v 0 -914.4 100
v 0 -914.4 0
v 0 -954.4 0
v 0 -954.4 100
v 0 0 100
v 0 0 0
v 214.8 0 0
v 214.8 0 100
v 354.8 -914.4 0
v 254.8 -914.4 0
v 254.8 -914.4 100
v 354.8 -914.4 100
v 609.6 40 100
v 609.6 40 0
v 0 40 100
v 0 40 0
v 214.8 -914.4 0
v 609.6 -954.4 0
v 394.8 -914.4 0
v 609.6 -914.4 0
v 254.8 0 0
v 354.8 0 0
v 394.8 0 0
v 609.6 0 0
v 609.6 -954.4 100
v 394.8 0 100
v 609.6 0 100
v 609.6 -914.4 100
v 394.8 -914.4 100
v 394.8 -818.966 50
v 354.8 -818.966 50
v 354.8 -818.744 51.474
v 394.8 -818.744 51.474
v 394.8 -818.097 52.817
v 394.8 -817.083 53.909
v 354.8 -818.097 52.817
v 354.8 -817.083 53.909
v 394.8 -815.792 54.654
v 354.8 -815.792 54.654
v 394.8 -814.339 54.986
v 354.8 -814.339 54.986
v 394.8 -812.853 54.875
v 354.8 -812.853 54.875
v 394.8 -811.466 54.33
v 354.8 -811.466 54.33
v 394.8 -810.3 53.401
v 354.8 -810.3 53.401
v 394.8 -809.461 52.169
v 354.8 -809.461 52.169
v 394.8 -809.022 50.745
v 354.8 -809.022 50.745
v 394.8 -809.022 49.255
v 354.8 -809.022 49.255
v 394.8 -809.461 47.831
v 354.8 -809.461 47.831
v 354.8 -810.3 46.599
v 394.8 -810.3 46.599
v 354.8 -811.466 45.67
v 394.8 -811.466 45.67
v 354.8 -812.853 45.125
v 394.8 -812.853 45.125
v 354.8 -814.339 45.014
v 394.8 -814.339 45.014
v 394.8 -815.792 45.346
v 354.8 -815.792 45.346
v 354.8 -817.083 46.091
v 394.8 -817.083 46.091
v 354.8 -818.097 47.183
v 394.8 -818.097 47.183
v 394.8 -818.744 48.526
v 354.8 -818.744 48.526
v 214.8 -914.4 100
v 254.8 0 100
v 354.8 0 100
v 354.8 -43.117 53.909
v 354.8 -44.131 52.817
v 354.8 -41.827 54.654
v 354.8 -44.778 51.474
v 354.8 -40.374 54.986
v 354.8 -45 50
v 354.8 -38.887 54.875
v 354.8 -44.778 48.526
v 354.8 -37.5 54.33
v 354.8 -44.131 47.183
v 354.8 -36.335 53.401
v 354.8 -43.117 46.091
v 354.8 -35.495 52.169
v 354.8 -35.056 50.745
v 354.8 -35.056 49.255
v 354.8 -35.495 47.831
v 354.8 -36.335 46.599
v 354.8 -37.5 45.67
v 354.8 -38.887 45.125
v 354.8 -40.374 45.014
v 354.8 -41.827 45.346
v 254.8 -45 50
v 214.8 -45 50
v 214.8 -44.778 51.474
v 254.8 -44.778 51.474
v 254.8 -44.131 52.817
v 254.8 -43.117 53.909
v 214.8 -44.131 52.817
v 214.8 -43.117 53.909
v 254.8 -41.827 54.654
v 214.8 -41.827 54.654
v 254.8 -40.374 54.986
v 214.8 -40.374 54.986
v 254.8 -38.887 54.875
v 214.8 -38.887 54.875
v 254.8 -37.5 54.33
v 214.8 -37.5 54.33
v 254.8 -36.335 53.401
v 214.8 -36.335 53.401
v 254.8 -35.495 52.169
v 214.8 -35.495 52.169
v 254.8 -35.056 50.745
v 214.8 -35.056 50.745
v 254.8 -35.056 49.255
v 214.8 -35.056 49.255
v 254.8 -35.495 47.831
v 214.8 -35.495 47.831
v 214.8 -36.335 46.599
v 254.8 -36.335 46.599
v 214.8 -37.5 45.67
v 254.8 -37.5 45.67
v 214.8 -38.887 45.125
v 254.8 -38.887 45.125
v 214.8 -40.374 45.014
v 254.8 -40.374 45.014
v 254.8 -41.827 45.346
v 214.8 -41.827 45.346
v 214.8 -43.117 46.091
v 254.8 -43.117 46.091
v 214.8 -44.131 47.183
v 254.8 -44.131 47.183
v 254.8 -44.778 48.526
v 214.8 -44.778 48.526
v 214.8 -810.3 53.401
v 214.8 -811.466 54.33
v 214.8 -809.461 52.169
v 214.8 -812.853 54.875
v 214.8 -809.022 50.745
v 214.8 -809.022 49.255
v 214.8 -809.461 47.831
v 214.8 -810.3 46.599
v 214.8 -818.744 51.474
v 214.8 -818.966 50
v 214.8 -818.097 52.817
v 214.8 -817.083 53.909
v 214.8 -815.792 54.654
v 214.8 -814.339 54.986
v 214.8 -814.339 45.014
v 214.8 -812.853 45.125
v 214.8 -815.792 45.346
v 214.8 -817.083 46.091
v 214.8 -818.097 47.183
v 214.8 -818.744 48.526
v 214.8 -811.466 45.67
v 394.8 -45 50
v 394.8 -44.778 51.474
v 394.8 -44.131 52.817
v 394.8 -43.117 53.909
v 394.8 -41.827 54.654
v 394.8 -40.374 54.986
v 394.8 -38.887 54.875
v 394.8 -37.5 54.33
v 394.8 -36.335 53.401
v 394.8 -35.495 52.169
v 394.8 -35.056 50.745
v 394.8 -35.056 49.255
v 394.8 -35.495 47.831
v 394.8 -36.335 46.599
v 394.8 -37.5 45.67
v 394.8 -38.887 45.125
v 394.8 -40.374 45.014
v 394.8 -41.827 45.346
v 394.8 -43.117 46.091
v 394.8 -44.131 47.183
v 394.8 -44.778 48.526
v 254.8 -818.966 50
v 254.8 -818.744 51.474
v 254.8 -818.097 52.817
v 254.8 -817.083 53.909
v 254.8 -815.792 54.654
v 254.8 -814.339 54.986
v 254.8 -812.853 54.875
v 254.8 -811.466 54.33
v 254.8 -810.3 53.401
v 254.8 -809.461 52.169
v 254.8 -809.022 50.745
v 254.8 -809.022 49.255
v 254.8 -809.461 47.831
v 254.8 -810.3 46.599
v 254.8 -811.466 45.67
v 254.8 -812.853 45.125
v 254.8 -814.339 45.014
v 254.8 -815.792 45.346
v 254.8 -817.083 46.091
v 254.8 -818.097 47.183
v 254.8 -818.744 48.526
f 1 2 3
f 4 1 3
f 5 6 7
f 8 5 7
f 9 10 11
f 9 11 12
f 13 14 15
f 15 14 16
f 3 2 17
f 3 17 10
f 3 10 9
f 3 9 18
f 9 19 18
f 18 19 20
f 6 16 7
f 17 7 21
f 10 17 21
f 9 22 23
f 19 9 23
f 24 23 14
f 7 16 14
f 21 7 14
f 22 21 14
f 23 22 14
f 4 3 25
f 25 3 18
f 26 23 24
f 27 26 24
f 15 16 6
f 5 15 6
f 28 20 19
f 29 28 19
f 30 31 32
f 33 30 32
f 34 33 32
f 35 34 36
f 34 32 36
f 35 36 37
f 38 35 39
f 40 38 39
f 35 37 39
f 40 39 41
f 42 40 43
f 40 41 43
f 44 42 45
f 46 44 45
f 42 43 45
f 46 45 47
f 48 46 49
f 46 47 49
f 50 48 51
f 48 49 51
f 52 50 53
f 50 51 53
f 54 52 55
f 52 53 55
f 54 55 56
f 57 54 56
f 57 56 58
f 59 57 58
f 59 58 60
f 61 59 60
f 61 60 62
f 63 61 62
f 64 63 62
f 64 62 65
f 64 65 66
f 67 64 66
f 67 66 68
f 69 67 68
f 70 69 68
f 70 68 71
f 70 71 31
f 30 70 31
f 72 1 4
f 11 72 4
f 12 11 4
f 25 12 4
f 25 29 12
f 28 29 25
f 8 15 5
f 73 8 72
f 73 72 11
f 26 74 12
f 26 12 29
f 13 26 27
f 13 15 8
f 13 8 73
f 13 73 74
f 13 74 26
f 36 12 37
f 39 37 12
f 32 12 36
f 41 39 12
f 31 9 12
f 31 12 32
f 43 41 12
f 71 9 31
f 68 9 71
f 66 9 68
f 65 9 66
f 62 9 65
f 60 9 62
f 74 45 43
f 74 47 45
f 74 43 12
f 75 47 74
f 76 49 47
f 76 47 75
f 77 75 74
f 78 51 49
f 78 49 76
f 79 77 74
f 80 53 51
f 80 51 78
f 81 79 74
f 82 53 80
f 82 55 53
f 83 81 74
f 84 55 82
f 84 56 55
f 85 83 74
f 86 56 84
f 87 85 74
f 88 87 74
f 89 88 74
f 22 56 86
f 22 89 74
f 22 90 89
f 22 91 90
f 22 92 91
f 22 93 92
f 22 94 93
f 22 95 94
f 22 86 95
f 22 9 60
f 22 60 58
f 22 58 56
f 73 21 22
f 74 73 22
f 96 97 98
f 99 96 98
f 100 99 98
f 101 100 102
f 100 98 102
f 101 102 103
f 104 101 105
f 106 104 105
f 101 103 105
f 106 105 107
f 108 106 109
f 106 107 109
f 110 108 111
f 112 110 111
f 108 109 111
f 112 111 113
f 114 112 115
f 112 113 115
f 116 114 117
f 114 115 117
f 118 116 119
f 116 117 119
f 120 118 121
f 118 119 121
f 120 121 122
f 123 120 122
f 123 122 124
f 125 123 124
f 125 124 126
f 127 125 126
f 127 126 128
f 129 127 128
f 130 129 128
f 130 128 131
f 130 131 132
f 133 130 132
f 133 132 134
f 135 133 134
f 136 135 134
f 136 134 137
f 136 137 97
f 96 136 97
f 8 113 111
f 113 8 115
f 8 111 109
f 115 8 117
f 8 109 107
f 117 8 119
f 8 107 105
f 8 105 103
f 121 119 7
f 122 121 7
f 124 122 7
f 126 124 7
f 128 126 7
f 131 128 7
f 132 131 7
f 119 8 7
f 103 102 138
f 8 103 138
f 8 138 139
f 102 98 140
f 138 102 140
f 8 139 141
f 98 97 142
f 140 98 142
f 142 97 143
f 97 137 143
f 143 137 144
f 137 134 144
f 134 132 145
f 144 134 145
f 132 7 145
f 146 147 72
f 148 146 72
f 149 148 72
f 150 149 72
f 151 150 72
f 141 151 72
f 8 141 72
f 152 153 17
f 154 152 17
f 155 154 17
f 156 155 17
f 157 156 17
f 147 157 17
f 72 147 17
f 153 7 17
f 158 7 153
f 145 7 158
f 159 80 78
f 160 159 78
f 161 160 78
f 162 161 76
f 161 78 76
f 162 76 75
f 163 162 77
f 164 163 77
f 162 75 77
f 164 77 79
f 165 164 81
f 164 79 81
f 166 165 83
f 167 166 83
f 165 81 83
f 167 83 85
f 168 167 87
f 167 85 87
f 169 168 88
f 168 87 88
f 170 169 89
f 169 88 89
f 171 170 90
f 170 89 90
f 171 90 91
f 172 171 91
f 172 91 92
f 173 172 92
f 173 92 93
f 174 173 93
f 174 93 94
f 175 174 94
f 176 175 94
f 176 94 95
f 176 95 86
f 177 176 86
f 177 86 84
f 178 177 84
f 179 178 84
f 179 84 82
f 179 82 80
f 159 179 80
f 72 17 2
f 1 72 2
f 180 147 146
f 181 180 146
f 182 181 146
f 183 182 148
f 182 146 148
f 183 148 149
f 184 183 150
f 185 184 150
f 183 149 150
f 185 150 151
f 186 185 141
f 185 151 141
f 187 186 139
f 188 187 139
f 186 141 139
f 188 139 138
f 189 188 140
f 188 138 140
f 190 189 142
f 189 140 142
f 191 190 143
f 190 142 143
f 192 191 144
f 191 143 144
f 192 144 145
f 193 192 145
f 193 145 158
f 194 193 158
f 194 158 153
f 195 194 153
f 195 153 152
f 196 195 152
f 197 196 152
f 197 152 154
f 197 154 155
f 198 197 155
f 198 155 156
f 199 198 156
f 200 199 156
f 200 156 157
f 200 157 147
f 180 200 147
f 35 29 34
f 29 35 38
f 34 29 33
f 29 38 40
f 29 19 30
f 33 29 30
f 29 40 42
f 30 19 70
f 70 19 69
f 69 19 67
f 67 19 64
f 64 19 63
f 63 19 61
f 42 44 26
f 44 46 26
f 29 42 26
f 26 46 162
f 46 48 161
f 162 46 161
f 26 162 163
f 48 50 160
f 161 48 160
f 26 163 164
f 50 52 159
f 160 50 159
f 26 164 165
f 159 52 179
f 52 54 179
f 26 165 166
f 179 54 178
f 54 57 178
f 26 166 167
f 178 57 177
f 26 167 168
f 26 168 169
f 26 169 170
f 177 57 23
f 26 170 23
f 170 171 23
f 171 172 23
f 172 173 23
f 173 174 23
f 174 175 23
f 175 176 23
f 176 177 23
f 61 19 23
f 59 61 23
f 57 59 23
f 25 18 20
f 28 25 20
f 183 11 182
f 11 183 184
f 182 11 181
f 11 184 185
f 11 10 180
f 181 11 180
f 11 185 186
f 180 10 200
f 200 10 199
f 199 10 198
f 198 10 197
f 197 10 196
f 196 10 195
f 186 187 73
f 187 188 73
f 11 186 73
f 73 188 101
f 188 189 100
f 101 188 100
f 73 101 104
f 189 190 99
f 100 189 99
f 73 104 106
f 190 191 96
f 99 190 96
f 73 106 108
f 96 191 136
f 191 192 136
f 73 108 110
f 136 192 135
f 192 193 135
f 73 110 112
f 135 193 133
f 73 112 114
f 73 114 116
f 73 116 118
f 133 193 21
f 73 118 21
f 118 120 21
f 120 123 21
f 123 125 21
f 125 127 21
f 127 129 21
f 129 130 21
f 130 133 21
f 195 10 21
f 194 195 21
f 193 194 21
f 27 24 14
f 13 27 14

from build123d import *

# Parameters (mm, degrees)
F0_W     = 100
F0_H     = 914.4
F1_DEPTH = 100
F3_D     = 10
F4_D     = 10


with BuildPart() as f1:
    # F0 (on Top) → F1 (new body)
    with BuildSketch(Plane.XY):
        Polygon((0, 40), (0, 0), (214.8, 0), (214.8, -914.4), (0, -914.4), (0, -954.4), (609.6, -954.4), (609.6, -914.4), (394.8, -914.4), (394.8, 0), (609.6, 0), (609.6, 40), align=None)
        with Locations((304.8, -457.2)):
            Rectangle(F0_W, F0_H, mode=Mode.SUBTRACT)
    extrude(amount=F1_DEPTH)

    # F3 (through all)
    with Locations(Plane.YZ.offset(394.8)):
        with Locations((-40, 50)):
            Hole(F3_D / 2)

    # F4 (through all)
    with Locations(Plane.YZ.offset(394.8)):
        with Locations((-813.965738, 50)):
            Hole(F4_D / 2)


solid = f1.part
